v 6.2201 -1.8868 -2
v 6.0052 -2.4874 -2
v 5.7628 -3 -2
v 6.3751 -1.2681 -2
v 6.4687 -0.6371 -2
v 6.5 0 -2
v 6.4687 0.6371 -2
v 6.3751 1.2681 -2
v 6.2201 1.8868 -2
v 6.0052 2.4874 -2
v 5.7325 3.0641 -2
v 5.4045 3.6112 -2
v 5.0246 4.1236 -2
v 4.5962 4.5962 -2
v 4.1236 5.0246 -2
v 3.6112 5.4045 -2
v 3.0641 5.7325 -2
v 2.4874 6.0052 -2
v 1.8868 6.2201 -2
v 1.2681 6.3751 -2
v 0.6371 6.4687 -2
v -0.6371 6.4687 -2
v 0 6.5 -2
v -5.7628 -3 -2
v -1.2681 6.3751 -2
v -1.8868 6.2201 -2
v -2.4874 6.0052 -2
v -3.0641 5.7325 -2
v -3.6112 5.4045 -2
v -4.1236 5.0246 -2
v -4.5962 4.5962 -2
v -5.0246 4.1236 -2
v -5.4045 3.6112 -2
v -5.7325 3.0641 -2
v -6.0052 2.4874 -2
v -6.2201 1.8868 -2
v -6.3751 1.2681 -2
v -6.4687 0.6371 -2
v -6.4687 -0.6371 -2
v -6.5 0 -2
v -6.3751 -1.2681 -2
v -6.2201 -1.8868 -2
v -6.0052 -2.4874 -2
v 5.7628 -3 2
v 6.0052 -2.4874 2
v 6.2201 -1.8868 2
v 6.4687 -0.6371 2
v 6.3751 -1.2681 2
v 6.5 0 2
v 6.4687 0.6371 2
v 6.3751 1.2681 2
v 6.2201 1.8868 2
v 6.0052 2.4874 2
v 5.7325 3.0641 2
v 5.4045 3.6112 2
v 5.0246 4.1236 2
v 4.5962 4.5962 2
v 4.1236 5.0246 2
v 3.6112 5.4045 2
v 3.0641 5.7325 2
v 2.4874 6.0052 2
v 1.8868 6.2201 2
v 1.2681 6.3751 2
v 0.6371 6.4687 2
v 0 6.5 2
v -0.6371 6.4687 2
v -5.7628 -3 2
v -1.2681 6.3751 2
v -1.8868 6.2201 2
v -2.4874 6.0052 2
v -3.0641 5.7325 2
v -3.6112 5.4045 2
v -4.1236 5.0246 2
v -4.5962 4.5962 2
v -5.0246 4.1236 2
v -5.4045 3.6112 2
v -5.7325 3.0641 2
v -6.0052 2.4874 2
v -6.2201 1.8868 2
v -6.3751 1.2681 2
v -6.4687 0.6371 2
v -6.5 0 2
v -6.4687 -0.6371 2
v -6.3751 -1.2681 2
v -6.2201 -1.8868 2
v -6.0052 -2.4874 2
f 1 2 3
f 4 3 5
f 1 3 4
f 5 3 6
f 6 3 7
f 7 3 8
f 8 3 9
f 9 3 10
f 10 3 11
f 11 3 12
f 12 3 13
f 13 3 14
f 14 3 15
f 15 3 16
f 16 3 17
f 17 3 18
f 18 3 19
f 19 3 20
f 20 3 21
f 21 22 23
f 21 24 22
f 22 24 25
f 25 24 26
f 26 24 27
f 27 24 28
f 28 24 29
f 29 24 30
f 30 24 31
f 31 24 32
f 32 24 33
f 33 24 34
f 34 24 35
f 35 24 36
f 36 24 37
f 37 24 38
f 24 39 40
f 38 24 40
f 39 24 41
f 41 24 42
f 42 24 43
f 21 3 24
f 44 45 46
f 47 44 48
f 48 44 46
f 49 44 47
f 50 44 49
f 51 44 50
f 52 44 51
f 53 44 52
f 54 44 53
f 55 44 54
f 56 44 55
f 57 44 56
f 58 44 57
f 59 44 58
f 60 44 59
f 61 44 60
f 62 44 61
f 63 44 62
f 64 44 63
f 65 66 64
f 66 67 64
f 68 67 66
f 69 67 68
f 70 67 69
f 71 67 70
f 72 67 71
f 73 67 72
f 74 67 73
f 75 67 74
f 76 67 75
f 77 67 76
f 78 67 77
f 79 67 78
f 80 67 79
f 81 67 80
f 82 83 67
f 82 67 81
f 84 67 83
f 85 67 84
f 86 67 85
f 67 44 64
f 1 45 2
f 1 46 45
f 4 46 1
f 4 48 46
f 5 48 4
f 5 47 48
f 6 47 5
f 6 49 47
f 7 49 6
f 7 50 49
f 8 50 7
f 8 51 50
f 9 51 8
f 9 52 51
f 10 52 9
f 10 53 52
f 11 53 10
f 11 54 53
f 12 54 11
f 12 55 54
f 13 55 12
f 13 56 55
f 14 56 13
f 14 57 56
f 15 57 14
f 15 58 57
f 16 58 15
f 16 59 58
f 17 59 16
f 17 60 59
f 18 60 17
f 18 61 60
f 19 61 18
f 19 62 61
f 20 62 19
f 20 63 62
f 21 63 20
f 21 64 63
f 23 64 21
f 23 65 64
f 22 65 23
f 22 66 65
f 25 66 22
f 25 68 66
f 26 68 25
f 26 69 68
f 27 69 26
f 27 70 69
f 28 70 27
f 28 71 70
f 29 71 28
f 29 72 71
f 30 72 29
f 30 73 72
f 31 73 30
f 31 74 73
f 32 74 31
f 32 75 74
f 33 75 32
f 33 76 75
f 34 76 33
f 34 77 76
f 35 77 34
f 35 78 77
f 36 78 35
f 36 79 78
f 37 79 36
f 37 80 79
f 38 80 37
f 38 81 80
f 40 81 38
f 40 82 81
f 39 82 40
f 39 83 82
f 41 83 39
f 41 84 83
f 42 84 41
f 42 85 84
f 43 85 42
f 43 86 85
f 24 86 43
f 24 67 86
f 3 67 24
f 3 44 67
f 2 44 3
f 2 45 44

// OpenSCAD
// Woodruff Key Parameters
key_width = 4;      // Nominal width of the key (b) in mm
key_diameter = 13;  // Nominal diameter of the key (d1) in mm
key_height = 9.5;   // Overall height of the key (h) in mm - based on DIN 6888 for d1=13, b=4

// --- Calculated Dimensions ---
key_radius = key_diameter / 2; // Radius of the cylindrical segment in mm
// Distance from the center of the cylinder to the flat bottom of the key.
// This is calculated as the total key height minus the cylinder's radius.
// For example, if key_height = 9.5mm and key_radius = 6.5mm, then cut_offset_from_center = 3mm.
// This means the flat bottom of the key is 3mm below the cylinder's center.
cut_offset_from_center = key_height - key_radius;

// --- Global Settings ---
$fn = 64; // Number of facets for circular objects, controls smoothness

// Module to create the 2D profile of the Woodruff key
// This profile is a circle with a segment cut off by a flat plane.
module woodruff_key_profile(diameter, height) {
    radius = diameter / 2;
    offset_from_center_to_flat = height - radius;

    difference() {
        // The base circle from which the key segment is cut
        circle(r = radius);

        // Cutting rectangle to remove the bottom part of the circle.
        // The circle is centered at (0,0).
        // The flat bottom of the key should be at y = -offset_from_center_to_flat.
        // The cutting rectangle needs to cover everything from y = -radius (bottom of the circle)
        // up to y = -offset_from_center_to_flat (the desired flat bottom of the key).
        // Its width is 'diameter', its height is 'radius - offset_from_center_to_flat'.
        // It's positioned with its bottom-left corner at (-diameter/2, -radius).
        translate([-diameter/2, -radius, 0]) {
            square([diameter, radius - offset_from_center_to_flat]);
        }
    }
}

// Main object: Extrude the 2D profile to create the 3D Woodruff key.
// The extrusion is centered on the Z-axis.
linear_extrude(height = key_width, center = true) {
    woodruff_key_profile(key_diameter, key_height);
}
